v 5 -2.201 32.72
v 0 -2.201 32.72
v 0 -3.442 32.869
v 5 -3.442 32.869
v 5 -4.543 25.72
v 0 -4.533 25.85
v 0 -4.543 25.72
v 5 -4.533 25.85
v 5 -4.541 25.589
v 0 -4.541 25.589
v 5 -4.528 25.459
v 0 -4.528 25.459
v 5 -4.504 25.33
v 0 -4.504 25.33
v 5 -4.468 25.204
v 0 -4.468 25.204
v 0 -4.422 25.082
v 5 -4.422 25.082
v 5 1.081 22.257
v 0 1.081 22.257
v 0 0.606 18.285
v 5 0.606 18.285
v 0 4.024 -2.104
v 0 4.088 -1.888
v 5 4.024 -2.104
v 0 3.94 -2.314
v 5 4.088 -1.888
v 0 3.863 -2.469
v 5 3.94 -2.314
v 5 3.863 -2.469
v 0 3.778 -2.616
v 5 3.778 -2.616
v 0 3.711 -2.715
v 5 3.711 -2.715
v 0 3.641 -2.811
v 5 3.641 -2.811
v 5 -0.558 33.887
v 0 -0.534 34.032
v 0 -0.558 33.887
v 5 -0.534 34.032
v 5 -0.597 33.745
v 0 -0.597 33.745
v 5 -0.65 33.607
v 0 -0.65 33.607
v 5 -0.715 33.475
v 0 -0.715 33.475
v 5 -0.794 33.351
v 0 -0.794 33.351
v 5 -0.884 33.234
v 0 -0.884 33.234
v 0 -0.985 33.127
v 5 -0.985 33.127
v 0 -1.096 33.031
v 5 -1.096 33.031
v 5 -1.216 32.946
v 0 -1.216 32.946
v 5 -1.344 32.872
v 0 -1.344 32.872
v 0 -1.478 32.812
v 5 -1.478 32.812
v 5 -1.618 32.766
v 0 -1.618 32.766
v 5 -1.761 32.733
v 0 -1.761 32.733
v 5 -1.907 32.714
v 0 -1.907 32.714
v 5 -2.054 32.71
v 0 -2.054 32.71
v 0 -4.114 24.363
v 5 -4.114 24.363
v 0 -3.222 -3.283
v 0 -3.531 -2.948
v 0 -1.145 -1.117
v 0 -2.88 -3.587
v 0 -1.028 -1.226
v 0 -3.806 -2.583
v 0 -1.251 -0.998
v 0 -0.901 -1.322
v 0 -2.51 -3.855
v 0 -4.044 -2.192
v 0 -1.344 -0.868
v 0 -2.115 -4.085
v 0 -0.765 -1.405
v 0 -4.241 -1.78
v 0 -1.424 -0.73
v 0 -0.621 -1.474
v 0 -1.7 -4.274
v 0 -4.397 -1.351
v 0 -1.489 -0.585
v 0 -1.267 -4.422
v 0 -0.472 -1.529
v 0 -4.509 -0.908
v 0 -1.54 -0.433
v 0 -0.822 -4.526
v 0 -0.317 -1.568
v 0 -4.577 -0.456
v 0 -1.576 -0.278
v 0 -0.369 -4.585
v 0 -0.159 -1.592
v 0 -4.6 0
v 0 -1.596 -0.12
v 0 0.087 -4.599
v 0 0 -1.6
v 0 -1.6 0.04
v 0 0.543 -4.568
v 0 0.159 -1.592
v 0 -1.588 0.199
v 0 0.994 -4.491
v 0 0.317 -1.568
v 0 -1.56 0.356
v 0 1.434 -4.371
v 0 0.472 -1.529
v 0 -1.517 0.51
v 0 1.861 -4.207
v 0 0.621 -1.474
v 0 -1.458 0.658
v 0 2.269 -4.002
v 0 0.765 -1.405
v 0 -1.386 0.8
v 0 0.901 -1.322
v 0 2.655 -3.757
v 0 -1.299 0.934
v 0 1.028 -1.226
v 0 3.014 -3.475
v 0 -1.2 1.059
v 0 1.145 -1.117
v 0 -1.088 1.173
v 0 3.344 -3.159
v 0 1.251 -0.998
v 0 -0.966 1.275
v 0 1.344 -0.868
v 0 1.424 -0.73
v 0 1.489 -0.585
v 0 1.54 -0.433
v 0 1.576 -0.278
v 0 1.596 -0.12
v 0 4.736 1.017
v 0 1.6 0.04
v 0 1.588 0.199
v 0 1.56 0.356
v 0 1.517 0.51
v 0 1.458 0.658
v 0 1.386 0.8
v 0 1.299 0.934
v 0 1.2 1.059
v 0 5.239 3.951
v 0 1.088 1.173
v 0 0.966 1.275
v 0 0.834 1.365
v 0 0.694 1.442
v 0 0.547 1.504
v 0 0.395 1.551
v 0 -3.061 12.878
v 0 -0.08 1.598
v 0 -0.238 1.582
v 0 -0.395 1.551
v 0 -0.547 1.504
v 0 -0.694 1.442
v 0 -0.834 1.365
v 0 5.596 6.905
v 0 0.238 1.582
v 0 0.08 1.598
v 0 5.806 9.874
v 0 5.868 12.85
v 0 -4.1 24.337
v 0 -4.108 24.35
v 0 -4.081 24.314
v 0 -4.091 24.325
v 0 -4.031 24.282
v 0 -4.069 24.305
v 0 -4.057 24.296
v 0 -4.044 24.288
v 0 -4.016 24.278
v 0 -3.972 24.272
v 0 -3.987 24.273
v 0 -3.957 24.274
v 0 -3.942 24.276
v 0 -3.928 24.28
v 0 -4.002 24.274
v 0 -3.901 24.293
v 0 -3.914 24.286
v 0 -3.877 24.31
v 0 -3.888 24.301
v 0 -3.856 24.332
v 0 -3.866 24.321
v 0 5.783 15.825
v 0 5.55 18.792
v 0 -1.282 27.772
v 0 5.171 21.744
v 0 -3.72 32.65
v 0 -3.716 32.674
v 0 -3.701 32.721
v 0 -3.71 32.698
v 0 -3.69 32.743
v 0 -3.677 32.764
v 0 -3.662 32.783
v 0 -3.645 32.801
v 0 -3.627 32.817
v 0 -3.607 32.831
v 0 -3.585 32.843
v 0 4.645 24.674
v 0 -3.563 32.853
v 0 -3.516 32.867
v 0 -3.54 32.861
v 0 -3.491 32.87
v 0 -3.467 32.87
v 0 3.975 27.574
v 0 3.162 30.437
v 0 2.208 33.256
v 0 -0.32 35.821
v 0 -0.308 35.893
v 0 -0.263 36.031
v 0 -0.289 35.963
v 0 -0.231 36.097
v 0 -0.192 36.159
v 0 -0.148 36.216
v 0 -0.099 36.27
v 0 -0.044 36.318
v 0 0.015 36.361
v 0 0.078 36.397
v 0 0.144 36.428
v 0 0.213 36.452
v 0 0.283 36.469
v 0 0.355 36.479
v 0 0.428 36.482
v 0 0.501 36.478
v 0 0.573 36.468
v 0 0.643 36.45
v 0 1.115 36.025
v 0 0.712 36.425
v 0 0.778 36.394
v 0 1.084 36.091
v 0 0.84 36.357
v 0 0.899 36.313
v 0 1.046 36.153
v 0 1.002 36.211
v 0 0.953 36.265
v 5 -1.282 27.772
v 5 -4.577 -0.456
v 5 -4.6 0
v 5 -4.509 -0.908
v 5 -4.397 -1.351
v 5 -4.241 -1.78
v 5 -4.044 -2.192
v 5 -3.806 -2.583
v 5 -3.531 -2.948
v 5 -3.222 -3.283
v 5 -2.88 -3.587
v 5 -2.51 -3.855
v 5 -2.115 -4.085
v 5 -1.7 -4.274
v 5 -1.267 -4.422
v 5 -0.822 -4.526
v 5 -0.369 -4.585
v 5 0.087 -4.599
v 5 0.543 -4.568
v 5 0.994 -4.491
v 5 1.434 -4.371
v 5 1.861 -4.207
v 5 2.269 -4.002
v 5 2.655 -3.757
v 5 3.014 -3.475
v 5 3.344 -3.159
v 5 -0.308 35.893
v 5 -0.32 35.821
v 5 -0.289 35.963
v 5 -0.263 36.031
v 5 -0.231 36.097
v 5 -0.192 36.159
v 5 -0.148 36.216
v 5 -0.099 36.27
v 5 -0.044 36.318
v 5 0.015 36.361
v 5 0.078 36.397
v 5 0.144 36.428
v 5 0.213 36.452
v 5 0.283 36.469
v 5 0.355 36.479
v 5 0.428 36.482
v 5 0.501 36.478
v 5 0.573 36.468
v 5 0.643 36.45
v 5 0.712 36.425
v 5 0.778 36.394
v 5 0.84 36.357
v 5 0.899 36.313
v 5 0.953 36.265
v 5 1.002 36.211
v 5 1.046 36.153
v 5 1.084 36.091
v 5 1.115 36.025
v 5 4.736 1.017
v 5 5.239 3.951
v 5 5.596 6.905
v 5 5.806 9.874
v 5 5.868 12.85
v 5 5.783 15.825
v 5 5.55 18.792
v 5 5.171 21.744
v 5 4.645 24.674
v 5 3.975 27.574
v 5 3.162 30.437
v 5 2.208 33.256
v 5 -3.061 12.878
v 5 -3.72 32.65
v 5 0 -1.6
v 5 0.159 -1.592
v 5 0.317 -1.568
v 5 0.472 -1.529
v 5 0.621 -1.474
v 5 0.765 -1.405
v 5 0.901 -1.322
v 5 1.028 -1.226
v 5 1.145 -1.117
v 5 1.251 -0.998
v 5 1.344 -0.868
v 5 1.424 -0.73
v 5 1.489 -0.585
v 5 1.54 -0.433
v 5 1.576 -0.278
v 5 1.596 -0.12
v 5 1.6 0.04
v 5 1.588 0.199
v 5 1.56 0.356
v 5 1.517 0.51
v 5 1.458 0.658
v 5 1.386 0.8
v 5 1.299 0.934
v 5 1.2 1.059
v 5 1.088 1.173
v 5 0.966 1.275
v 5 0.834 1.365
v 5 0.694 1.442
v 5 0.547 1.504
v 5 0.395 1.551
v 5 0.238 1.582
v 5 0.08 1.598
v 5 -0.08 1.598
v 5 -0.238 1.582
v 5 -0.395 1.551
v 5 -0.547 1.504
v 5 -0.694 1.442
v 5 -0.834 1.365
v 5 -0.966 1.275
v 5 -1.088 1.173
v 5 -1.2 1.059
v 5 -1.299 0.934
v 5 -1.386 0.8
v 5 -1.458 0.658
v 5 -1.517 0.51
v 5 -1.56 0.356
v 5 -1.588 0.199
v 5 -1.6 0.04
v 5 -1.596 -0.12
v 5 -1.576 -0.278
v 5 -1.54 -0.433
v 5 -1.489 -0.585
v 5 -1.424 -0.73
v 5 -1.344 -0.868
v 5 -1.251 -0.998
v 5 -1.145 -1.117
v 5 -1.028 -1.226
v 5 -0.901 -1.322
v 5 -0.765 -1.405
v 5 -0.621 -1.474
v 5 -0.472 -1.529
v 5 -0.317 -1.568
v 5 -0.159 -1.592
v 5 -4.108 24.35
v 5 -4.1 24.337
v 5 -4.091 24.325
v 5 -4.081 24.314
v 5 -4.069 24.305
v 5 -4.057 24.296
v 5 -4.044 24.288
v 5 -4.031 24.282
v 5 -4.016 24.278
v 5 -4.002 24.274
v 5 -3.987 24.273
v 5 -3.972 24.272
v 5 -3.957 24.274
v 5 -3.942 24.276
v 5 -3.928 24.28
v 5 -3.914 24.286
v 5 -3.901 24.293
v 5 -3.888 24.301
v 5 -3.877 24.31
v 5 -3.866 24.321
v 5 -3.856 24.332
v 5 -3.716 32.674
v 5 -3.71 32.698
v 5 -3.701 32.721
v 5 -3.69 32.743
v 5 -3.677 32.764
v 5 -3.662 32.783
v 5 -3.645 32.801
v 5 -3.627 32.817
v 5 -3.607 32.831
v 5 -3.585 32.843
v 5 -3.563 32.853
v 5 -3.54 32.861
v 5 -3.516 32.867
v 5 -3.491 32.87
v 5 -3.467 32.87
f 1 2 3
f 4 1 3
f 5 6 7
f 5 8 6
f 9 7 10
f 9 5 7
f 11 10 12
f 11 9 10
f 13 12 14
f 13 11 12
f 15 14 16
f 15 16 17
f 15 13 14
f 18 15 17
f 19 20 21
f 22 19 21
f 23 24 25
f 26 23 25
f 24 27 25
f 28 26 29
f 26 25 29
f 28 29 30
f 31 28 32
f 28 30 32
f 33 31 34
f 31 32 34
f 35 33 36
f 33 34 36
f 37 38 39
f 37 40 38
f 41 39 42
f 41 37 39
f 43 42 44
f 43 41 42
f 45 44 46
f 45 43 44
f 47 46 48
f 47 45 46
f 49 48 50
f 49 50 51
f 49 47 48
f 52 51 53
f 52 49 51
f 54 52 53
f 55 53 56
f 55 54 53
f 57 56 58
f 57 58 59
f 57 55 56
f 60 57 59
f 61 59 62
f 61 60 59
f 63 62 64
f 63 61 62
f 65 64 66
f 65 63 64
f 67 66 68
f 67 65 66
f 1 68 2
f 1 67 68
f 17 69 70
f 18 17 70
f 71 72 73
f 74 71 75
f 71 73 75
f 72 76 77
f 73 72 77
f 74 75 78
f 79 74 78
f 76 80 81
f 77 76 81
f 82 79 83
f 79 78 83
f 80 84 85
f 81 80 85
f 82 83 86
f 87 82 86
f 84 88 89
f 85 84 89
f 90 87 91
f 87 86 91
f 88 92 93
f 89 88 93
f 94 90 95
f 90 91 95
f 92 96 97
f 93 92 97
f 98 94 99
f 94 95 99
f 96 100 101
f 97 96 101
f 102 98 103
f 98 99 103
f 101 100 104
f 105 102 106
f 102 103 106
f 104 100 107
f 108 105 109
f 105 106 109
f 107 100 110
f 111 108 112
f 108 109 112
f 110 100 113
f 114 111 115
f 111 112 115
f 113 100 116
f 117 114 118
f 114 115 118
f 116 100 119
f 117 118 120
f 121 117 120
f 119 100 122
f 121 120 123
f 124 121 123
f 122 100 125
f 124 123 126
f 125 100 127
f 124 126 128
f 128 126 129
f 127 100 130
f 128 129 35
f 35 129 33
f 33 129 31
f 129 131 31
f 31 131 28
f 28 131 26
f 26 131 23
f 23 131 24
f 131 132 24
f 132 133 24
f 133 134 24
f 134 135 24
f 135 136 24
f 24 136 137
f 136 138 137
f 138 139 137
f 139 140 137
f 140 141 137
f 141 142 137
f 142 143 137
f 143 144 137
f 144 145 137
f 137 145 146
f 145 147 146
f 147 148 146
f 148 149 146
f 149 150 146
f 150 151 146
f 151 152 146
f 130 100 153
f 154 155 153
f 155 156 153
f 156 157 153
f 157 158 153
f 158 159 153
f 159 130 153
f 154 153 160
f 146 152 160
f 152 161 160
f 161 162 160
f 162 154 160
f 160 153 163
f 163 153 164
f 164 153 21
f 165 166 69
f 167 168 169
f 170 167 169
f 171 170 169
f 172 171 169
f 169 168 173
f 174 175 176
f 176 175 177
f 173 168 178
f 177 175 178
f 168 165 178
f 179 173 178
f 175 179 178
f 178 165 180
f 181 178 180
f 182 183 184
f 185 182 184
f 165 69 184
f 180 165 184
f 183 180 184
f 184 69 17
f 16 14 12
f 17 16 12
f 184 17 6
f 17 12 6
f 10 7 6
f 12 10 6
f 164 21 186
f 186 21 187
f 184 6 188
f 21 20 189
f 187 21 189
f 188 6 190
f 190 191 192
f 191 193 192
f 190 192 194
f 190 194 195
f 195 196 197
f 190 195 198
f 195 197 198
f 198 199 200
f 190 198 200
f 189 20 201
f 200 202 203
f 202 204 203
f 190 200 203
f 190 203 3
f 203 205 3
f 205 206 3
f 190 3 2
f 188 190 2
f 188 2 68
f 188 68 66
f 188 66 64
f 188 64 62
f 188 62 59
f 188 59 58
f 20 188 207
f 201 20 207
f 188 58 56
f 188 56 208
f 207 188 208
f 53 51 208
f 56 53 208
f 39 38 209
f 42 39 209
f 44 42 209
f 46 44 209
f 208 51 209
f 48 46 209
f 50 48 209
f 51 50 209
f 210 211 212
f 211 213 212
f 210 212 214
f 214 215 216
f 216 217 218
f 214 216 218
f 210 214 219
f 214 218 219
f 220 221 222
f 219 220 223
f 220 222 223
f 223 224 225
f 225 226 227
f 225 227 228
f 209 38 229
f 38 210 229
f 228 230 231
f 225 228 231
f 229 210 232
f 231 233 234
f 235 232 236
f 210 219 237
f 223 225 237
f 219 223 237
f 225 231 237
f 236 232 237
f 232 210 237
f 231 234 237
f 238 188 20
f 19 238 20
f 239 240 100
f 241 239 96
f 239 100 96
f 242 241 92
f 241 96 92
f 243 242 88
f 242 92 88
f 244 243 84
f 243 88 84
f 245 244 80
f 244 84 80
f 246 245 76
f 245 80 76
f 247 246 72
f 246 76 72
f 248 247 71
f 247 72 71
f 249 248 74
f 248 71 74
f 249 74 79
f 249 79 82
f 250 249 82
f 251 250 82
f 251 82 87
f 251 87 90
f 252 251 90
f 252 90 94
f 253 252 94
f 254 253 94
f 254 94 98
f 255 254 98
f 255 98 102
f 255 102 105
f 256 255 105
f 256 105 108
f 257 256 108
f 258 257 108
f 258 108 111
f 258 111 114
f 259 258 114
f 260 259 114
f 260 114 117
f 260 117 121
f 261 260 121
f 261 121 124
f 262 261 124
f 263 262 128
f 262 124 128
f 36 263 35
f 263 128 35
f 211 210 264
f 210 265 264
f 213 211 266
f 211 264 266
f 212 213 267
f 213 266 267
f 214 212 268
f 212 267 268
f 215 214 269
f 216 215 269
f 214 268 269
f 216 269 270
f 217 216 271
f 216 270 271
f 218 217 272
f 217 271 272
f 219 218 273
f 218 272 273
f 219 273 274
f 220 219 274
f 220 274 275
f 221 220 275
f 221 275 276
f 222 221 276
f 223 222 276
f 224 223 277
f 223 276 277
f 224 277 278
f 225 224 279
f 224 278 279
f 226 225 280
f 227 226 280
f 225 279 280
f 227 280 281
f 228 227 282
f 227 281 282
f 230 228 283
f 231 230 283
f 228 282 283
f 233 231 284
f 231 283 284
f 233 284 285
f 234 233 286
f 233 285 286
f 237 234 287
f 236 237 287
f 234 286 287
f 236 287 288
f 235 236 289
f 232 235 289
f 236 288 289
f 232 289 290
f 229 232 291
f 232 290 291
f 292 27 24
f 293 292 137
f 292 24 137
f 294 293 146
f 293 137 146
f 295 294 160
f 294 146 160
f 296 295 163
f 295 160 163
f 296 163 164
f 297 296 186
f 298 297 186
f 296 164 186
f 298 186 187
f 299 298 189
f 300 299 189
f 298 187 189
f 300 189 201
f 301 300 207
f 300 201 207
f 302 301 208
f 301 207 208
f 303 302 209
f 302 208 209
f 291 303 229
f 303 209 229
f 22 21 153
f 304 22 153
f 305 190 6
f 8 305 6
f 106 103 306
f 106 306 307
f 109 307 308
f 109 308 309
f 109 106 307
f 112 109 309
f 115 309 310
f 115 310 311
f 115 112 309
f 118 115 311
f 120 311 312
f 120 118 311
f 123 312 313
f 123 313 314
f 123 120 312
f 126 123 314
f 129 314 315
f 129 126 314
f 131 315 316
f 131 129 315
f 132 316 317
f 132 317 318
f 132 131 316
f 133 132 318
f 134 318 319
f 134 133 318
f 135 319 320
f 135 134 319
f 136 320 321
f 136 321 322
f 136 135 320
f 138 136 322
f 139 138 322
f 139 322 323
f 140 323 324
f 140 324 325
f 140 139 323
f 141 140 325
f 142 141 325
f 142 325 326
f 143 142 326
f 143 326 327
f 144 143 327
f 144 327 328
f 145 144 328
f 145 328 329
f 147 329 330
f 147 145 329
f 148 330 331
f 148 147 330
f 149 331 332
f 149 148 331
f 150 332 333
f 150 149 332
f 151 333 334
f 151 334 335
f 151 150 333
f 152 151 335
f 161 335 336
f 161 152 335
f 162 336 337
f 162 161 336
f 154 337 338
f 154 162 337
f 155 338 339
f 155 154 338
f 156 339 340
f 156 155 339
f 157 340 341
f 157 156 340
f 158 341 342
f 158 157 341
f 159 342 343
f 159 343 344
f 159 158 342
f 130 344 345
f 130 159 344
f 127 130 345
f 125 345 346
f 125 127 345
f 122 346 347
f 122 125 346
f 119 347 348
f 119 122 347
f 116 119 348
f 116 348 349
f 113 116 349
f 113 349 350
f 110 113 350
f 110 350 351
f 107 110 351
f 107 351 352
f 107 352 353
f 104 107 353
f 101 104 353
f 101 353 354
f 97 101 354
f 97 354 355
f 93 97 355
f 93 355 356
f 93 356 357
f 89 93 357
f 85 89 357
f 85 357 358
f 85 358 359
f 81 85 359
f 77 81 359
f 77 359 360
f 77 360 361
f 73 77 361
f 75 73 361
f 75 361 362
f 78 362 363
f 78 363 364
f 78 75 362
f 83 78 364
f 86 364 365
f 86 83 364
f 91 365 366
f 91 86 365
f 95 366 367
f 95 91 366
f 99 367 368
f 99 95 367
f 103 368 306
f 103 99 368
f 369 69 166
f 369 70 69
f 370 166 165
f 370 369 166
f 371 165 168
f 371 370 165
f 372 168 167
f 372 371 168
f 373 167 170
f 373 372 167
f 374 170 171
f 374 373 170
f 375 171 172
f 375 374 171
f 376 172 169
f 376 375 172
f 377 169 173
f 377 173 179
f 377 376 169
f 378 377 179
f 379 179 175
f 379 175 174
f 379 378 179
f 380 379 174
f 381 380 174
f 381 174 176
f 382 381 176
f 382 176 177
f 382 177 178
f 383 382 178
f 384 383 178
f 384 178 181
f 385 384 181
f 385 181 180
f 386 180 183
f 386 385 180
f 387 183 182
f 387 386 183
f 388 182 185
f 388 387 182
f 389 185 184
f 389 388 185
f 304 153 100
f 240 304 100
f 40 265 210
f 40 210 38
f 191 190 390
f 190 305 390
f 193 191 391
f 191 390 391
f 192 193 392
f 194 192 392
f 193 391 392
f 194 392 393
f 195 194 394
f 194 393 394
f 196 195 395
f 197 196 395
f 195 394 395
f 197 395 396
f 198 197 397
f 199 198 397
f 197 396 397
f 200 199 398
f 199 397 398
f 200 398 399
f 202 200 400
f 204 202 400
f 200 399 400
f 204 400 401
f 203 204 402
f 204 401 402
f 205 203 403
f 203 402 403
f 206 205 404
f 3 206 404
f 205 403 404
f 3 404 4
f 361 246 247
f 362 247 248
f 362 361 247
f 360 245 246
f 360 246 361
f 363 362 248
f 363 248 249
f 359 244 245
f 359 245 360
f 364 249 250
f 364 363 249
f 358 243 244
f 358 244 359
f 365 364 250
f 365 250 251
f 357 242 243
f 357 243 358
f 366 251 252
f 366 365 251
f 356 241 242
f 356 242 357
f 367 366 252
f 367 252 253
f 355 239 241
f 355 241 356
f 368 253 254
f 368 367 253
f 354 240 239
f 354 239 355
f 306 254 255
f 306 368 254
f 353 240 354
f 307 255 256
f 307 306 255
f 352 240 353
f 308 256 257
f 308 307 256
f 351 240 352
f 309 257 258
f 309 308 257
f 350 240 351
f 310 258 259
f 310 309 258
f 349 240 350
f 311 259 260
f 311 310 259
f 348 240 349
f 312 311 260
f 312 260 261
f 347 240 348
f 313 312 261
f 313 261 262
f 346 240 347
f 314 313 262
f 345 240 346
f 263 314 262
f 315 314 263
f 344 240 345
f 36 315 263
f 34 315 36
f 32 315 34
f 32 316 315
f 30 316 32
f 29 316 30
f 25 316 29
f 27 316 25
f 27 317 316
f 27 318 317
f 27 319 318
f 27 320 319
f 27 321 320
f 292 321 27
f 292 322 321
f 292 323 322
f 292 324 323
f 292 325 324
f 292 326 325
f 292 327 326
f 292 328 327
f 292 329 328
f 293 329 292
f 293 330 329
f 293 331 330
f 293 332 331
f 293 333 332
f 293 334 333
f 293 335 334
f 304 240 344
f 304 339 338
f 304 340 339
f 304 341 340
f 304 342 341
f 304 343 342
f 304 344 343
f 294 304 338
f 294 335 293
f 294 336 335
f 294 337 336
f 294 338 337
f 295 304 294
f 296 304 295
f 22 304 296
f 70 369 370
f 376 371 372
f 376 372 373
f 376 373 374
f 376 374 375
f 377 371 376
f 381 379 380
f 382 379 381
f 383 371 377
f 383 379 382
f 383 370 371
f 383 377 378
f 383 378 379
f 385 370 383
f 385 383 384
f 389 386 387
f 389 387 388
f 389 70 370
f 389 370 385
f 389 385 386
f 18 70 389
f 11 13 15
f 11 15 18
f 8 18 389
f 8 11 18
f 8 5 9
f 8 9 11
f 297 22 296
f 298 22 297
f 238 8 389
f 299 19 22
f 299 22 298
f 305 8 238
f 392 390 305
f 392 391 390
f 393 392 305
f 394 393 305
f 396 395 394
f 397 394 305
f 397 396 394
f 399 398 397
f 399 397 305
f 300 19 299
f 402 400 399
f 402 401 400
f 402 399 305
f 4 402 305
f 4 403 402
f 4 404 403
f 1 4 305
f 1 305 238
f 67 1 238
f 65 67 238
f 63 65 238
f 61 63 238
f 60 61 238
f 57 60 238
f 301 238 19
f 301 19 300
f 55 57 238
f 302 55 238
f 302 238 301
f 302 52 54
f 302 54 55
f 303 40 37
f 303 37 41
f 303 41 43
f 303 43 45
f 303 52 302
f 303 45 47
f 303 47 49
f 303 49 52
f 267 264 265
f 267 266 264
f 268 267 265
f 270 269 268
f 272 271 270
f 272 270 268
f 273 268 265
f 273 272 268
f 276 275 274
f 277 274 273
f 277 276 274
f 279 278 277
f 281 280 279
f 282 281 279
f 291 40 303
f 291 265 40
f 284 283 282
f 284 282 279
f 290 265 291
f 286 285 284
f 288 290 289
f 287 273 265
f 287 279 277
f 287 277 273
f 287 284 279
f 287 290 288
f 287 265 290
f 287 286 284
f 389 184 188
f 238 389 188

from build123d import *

# Parameters (mm, degrees)
SKETCH2_R           = 1.6
BOSS_EXTRUDE1_DEPTH = 5
FILLET2_R           = 1.5
CHAMFER1_SIZE       = 2.5
CHAMFER1_SIZE2      = 1.443375673
FILLET3_R           = 1.5
FILLET4_R           = 0.25
FILLET5_R           = 0.15
FILLET6_R           = 0.75
FILLET7_R           = 2.5


with BuildPart() as part:
    # Sketch2 → Boss-Extrude1 (new body)
    with BuildSketch(Plane.YZ):
        with BuildLine():
            Line((0, 38.5), (-0.711820293, 32.542373638))
            Line((-0.711820293, 32.542373638), (-3.690633474, 32.898283784))
            Line((-3.690633474, 32.898283784), (-4.877000628, 22.968906514))
            Line((-4.877000628, 22.968906514), (-1.281732991, 27.772452143))
            Line((-1.281732991, 27.772452143), (1.080625734, 22.257086221))
            Line((1.080625734, 22.257086221), (0.606078872, 18.285335313))
            Line((0.606078872, 18.285335313), (-3.061283722, 12.878386238))
            Line((-3.061283722, 12.878386238), (-4.6, 0))
            ThreePointArc((-4.6, 0), (-1.190567607, -4.443258801), (3.983716857, -2.3))
            ThreePointArc((3.983716857, -2.3), (5.584415843, 18.450777734), (0, 38.5))
        make_face()
        with Locations(Location((0, 0, 0), (0, 0, 270))):
            Circle(SKETCH2_R, mode=Mode.SUBTRACT)
    extrude(amount=BOSS_EXTRUDE1_DEPTH)

    # Fillet2
    fillet2_edges = [part.edges().sort_by_distance(p)[0] for p in [
        (2.5, -0.711820293, 32.542373638),
    ]]
    fillet(fillet2_edges, radius=FILLET2_R)

    # Chamfer1
    chamfer1_edges = [part.edges().sort_by_distance(p)[0] for p in [
        (2.5, -4.877000628, 22.968906514),
    ]]
    chamfer1_side = [part.faces().sort_by_distance(p)[0] for p in [
        (2.5, -4.283817051, 27.933595149),
    ]]
    chamfer(chamfer1_edges, length=CHAMFER1_SIZE, length2=CHAMFER1_SIZE2, reference=chamfer1_side[0])

    # Fillet3
    fillet3_edges = [part.edges().sort_by_distance(p)[0] for p in [
        (2.5, -4.580408839, 25.451250831),
    ]]
    fillet(fillet3_edges, radius=FILLET3_R)

    # Fillet4
    fillet4_edges = [part.edges().sort_by_distance(p)[0] for p in [
        (2.5, -3.690633474, 32.898283784),
    ]]
    fillet(fillet4_edges, radius=FILLET4_R)

    # Fillet5
    fillet5_edges = [part.edges().sort_by_distance(p)[0] for p in [
        (2.5, -4.012113654, 24.124459998),
    ]]
    fillet(fillet5_edges, radius=FILLET5_R)

    # Fillet6
    fillet6_edges = [part.edges().sort_by_distance(p)[0] for p in [
        (2.5, 0, 38.5),
    ]]
    fillet(fillet6_edges, radius=FILLET6_R)

    # Fillet7
    fillet7_edges = [part.edges().sort_by_distance(p)[0] for p in [
        (2.5, 3.983716857, -2.3),
    ]]
    fillet(fillet7_edges, radius=FILLET7_R)


solid = part.part
